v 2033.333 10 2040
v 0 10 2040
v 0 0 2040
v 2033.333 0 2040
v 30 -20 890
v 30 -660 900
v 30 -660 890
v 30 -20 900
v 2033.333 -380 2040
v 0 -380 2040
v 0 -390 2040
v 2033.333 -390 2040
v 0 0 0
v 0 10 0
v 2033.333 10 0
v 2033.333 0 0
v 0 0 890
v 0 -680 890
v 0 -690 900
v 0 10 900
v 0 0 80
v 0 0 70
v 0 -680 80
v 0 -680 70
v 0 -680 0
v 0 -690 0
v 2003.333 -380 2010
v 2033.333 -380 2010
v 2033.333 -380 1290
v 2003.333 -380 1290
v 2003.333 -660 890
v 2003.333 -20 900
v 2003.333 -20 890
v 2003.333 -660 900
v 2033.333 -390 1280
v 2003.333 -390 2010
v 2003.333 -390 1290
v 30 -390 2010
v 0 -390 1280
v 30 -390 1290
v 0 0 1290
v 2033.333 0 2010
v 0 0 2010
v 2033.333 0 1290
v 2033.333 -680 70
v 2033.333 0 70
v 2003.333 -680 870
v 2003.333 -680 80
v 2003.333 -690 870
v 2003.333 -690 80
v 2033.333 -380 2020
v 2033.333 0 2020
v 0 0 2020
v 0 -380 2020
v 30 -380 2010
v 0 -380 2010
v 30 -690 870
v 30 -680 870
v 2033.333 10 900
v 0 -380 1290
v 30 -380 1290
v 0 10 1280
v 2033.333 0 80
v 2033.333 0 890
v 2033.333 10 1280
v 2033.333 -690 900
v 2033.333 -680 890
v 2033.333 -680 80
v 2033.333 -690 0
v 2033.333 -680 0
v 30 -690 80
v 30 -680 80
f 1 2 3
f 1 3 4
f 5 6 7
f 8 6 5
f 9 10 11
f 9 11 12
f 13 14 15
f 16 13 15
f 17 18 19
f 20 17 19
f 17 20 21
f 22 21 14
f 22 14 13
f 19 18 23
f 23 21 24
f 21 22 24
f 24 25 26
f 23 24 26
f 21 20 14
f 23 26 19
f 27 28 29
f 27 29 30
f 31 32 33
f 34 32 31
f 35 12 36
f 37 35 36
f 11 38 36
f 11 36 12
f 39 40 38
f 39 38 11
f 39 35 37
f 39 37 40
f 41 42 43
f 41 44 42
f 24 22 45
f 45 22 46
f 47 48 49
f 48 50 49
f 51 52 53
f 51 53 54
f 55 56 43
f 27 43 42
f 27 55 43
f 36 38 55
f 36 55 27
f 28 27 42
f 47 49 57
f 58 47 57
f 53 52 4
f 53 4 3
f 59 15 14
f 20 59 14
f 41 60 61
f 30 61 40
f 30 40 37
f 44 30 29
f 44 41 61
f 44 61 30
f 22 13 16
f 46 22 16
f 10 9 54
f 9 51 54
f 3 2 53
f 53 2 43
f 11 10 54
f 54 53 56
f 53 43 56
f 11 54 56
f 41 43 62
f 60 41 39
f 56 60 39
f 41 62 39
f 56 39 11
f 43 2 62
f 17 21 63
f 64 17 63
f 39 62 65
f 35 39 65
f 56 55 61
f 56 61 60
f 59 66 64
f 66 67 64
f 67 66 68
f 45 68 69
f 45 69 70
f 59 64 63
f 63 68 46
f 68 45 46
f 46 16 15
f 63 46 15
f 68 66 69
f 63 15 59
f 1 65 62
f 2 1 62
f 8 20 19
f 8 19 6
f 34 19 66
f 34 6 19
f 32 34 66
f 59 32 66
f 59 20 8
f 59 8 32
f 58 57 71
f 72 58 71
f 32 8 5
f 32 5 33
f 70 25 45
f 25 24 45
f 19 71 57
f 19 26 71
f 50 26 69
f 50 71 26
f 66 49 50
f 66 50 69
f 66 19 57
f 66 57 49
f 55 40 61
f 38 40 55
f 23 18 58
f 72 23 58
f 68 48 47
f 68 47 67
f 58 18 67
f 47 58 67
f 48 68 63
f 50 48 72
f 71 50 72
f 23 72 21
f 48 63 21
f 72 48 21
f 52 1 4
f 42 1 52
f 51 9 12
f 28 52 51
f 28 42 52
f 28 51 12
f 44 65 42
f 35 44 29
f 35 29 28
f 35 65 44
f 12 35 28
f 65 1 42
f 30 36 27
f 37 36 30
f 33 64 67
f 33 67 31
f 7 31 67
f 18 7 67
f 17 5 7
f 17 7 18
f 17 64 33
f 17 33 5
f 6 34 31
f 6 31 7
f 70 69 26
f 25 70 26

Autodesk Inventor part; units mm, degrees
ref_plane "YZ Plane" through (0, 0, 0) normal (1, 0, 0) x (0, 1, 0)
ref_plane "XZ Plane" through (0, 0, 0) normal (0, 1, 0) x (-1, 0, 0)
sketch "Sketch1" plane through (0, 0, 0) normal (0, 0, 1) x (1, 0, 0)
  line L0 (0, 0) -> (2033.3333, 0)
  line L1 (2033.3333, 0) -> (2033.3333, 10)
  line L2 (2033.3333, 10) -> (0, 10)
  line L3 (0, 10) -> (0, 0)
  dimension "ancho" = 2033.3333
  dimension "espesor" = 10
extrude "Extrusion1" add sketch "Sketch1" along normal blind 900
sketch "Sketch2" plane through (0, 0, 0) normal (0, -1, 0) x (1, 0, 0)
  line L0 (0, 0) -> (2033.3333, 0) construction
  line L1 (2033.3333, 0) -> (2033.3333, 900) construction
  line L2 (0, 900) -> (2033.3333, 900) construction
  line L3 (0, 0) -> (0, 900) construction
  line L4 (0, 0) -> (0, 900) projected
  line L5 (0, 70) -> (2033.3333, 70)
  line L6 (2033.3333, 70) -> (2033.3333, 80)
  line L7 (2033.3333, 80) -> (0, 80)
  line L8 (0, 80) -> (0, 70)
  line L9 (0, 900) -> (2033.3333, 900) projected
  line L10 (2033.3333, 0) -> (2033.3333, 900) projected
  line L11 (0, 900) -> (2033.3333, 900)
  line L12 (2033.3333, 900) -> (2033.3333, 890)
  line L13 (2033.3333, 890) -> (0, 890)
  line L14 (0, 890) -> (0, 900)
  dimension "d5" = 10
  dimension "d6" = 10
  dimension "d7" = 80
extrude "Extrusion2" add sketch "Sketch2" along normal blind 690 contours L4 L7 L6 L5 | L4 L9 L10 L13
sketch "Sketch3" plane through (0, 0, 900) normal (0, 0, 1) x (1, 0, 0)
  line L0 (2033.3333, 10) -> (2033.3333, -690) projected
  line L1 (2033.3333, 10) -> (0, 10) projected
  line L2 (0, 10) -> (0, -690) projected
  line L3 (2033.3333, -690) -> (0, -690) projected
  line L4 (30, -660) -> (30, -20)
  line L5 (30, -20) -> (2003.3333, -20)
  line L6 (2003.3333, -20) -> (2003.3333, -660)
  line L7 (2003.3333, -660) -> (30, -660)
  point P0 (0, 0)
  dimension "d10" = 30
extrude "Extrusion3" cut sketch "Sketch3" against normal up to next contours L4 L5 L6 L7
sketch "Sketch4" plane through (0, -690, 0) normal (0, -1, 0) x (1, 0, 0)
  line L0 (0, 70) -> (2033.3333, 70) construction
  line L1 (2033.3333, 70) -> (2033.3333, 80) construction
  line L2 (2033.3333, 80) -> (0, 80) construction
  line L3 (0, 80) -> (0, 70) construction
  line L4 (0, 900) -> (0, 890) construction
  line L5 (0, 890) -> (2033.3333, 890) construction
  line L6 (2033.3333, 890) -> (2033.3333, 900) construction
  line L7 (2033.3333, 900) -> (0, 900) construction
  line L8 (2033.3333, 70) -> (0, 70) construction
  line L9 (0, 0) -> (0, 70) construction
  line L10 (0, 0) -> (2033.3333, 0) construction
  line L11 (2033.3333, 0) -> (2033.3333, 70) construction
  line L12 (0, 900) -> (2033.3333, 900)
  line L13 (2033.3333, 900) -> (2033.3333, 0)
  line L14 (2033.3333, 0) -> (0, 0)
  line L15 (0, 0) -> (0, 900)
  line L16 (2033.3333, 80) -> (0, 80) projected
  line L17 (30, 80) -> (2003.3333, 80)
  line L18 (2003.3333, 80) -> (2003.3333, 890)
  line L19 (2003.3333, 890) -> (30, 890)
  line L20 (30, 890) -> (30, 80)
  dimension "d13" = 30
  dimension "d14" = 30
extrude "Extrusion4" add sketch "Sketch4" against normal blind 10 contours L12 L13 L16 L18 L19 L20 L15 | L16 L13 L14 L15
ref_plane "Work Plane1" through (0, 0, 1280) normal (0, 0, 1) x (1, 0, 0)
sketch "Sketch5" plane through (0, 0, 1280) normal (0, 0, 1) x (1, 0, 0)
  line L0 (2033.3333, 10) -> (0, 10) projected
  line L1 (0, 10) -> (0, -690) projected
  line L2 (2033.3333, 10) -> (2033.3333, -690) projected
  line L3 (2033.3333, -690) -> (0, -690) projected
  line L4 (0, 10) -> (2033.3333, 10)
  line L5 (2033.3333, 10) -> (2033.3333, -390)
  line L6 (2033.3333, -390) -> (0, -390)
  line L7 (0, -390) -> (0, 10)
  line L8 (2003.3333, -660) -> (2003.3333, -20) projected
  line L9 (0, -390) -> (2003.3333, -390)
  line L10 (2003.3333, -390) -> (2003.3333, -380)
  line L11 (2003.3333, -380) -> (0, -380)
  line L12 (0, -380) -> (0, -390)
  point P0 (0, 0)
  dimension "d36" = 2033.3333
  dimension "profundidad2" = 400
  dimension "d39" = 10
extrude "Extrusion5" add sketch "Sketch5" along normal blind 10 contours L2 L6 L8 L11 L1 L0 | L11 L8 L6 L1
sketch "Sketch9" plane through (0, -690, 0) normal (0, -1, 0) x (1, 0, 0)
  line L0 (30, 890) -> (2003.3333, 890) construction
  line L1 (2003.3333, 80) -> (30, 80) construction
  line L2 (0, 900) -> (0, 0) construction
  line L3 (2033.3333, 0) -> (0, 0) construction
  line L4 (2033.3333, 900) -> (2033.3333, 0) construction
  line L5 (2033.3333, 900) -> (0, 900) construction
  line L6 (2033.3333, 70) -> (2033.3333, 0) projected
  line L7 (0, 900) -> (2033.3333, 900)
  line L8 (2033.3333, 900) -> (2033.3333, 870)
  line L9 (2033.3333, 870) -> (0, 870)
  line L10 (0, 870) -> (0, 900)
  line L11 (2003.3333, 890) -> (2003.3333, 80) projected
  line L12 (30, 80) -> (30, 890) projected
  point P0 (2033.3333, 890)
  point P1 (2033.3333, 80)
  dimension "d32" = 30
extrude "Extrusion9" add sketch "Sketch9" against normal blind 10
sketch "Boceto10" plane through (0, 0, 1290) normal (0, 0, 1) x (1, 0, 0)
  line L0 (0, 10) -> (0, -390) projected
  line L1 (0, -390) -> (2033.3333, -390) projected
  line L2 (2033.3333, -390) -> (2033.3333, 10) projected
  line L3 (2033.3333, 10) -> (0, 10) projected
  line L4 (2033.3333, 10) -> (2033.3333, -690) projected
  line L5 (0, -390) -> (2033.3333, -390)
  line L6 (2033.3333, -390) -> (2033.3333, -380)
  line L7 (2033.3333, -380) -> (0, -380)
  line L8 (0, -380) -> (0, -390)
  line L9 (0, 10) -> (2033.3333, 10)
  line L10 (2033.3333, 10) -> (2033.3333, 0)
  line L11 (2033.3333, 0) -> (0, 0)
  line L12 (0, 0) -> (0, 10)
  point P0 (0, 0)
  dimension "d40" = 10
  dimension "d41" = 10
extrude "Extrusión10" add sketch "Boceto10" along normal blind 750 contours L3 L2 L11 L0 | L7 L2 L1 L0
sketch "Boceto11" plane through (0, -390, 1280) normal (0, -1, 0) x (1, 0, 0)
  line L0 (0, 760) -> (2033.3333, 760) projected
  line L1 (2033.3333, 0) -> (2033.3333, 760) projected
  line L2 (0, 760) -> (2033.3333, 760) projected
  line L3 (0, 0) -> (0, 760) projected
  line L4 (30, 730) -> (2003.3333, 730)
  line L5 (2003.3333, 730) -> (2003.3333, 10)
  line L6 (2003.3333, 10) -> (30, 10)
  line L7 (30, 10) -> (30, 730)
  line L8 (0, 0) -> (2033.3333, 0) projected
  point P0 (0, -1280)
  dimension "d44" = 30
  dimension "d45" = 30
  dimension "d46" = 30
extrude "Extrusión11" cut sketch "Boceto11" against normal up to next contours L4 L5 L6 L7
sketch "Sketch13" plane through (2033.3333, -390, 1280) normal (1, 0, 0) x (0, 0, -1)
  line L0 (0, 0) -> (0, 400) construction
  line L1 (0, 400) -> (-760, 400) construction
  line L2 (-10, 390) -> (-760, 390) construction
  line L3 (-10, 10) -> (-760, 10) construction
  line L4 (-760, 0) -> (-760, 10) construction
  line L5 (0, 0) -> (-760, 0) construction
  line L6 (1280, 400) -> (-760, 400) projected
  line L7 (-740, 0) -> (-730, 0)
  line L8 (-730, 0) -> (-730, 400)
  line L9 (-730, 400) -> (-740, 400)
  line L10 (-740, 400) -> (-740, 0)
  line L11 (-760, 390) -> (-760, 400) projected
  line L12 (-10, 10) -> (-10, 390) projected
  point P0 (1280, 390)
  point P1 (1030, 400)
  dimension "d53" = 10
  dimension "d54" = 20
extrude "Extrusion13" add sketch "Sketch13" against normal blind 2033.3333
equation "\"d5\" = espesor"
equation "\"d6\" = espesor"
equation "\"d10\" = 3 * espesor"
equation "\"d13\" = 3 * espesor"
equation "\"d14\" = 3 * espesor"
equation "\"d15\" = espesor"
equation "\"d36\" = ancho"
equation "\"d39\" = espesor"
equation "\"d18\" = espesor"
equation "\"d32\" = 3 * espesor"
equation "\"d33\" = espesor"
equation "\"d40\" = espesor"
equation "\"d41\" = espesor"
equation "\"d44\" = 3 * espesor"
equation "\"d45\" = 3 * espesor"
equation "\"d46\" = 3 * espesor"
equation "\"d53\" = espesor"
equation "\"d54\" = 2 * espesor"
equation "\"d55\" = ancho"
properties part number "esqueleto_mueble"
